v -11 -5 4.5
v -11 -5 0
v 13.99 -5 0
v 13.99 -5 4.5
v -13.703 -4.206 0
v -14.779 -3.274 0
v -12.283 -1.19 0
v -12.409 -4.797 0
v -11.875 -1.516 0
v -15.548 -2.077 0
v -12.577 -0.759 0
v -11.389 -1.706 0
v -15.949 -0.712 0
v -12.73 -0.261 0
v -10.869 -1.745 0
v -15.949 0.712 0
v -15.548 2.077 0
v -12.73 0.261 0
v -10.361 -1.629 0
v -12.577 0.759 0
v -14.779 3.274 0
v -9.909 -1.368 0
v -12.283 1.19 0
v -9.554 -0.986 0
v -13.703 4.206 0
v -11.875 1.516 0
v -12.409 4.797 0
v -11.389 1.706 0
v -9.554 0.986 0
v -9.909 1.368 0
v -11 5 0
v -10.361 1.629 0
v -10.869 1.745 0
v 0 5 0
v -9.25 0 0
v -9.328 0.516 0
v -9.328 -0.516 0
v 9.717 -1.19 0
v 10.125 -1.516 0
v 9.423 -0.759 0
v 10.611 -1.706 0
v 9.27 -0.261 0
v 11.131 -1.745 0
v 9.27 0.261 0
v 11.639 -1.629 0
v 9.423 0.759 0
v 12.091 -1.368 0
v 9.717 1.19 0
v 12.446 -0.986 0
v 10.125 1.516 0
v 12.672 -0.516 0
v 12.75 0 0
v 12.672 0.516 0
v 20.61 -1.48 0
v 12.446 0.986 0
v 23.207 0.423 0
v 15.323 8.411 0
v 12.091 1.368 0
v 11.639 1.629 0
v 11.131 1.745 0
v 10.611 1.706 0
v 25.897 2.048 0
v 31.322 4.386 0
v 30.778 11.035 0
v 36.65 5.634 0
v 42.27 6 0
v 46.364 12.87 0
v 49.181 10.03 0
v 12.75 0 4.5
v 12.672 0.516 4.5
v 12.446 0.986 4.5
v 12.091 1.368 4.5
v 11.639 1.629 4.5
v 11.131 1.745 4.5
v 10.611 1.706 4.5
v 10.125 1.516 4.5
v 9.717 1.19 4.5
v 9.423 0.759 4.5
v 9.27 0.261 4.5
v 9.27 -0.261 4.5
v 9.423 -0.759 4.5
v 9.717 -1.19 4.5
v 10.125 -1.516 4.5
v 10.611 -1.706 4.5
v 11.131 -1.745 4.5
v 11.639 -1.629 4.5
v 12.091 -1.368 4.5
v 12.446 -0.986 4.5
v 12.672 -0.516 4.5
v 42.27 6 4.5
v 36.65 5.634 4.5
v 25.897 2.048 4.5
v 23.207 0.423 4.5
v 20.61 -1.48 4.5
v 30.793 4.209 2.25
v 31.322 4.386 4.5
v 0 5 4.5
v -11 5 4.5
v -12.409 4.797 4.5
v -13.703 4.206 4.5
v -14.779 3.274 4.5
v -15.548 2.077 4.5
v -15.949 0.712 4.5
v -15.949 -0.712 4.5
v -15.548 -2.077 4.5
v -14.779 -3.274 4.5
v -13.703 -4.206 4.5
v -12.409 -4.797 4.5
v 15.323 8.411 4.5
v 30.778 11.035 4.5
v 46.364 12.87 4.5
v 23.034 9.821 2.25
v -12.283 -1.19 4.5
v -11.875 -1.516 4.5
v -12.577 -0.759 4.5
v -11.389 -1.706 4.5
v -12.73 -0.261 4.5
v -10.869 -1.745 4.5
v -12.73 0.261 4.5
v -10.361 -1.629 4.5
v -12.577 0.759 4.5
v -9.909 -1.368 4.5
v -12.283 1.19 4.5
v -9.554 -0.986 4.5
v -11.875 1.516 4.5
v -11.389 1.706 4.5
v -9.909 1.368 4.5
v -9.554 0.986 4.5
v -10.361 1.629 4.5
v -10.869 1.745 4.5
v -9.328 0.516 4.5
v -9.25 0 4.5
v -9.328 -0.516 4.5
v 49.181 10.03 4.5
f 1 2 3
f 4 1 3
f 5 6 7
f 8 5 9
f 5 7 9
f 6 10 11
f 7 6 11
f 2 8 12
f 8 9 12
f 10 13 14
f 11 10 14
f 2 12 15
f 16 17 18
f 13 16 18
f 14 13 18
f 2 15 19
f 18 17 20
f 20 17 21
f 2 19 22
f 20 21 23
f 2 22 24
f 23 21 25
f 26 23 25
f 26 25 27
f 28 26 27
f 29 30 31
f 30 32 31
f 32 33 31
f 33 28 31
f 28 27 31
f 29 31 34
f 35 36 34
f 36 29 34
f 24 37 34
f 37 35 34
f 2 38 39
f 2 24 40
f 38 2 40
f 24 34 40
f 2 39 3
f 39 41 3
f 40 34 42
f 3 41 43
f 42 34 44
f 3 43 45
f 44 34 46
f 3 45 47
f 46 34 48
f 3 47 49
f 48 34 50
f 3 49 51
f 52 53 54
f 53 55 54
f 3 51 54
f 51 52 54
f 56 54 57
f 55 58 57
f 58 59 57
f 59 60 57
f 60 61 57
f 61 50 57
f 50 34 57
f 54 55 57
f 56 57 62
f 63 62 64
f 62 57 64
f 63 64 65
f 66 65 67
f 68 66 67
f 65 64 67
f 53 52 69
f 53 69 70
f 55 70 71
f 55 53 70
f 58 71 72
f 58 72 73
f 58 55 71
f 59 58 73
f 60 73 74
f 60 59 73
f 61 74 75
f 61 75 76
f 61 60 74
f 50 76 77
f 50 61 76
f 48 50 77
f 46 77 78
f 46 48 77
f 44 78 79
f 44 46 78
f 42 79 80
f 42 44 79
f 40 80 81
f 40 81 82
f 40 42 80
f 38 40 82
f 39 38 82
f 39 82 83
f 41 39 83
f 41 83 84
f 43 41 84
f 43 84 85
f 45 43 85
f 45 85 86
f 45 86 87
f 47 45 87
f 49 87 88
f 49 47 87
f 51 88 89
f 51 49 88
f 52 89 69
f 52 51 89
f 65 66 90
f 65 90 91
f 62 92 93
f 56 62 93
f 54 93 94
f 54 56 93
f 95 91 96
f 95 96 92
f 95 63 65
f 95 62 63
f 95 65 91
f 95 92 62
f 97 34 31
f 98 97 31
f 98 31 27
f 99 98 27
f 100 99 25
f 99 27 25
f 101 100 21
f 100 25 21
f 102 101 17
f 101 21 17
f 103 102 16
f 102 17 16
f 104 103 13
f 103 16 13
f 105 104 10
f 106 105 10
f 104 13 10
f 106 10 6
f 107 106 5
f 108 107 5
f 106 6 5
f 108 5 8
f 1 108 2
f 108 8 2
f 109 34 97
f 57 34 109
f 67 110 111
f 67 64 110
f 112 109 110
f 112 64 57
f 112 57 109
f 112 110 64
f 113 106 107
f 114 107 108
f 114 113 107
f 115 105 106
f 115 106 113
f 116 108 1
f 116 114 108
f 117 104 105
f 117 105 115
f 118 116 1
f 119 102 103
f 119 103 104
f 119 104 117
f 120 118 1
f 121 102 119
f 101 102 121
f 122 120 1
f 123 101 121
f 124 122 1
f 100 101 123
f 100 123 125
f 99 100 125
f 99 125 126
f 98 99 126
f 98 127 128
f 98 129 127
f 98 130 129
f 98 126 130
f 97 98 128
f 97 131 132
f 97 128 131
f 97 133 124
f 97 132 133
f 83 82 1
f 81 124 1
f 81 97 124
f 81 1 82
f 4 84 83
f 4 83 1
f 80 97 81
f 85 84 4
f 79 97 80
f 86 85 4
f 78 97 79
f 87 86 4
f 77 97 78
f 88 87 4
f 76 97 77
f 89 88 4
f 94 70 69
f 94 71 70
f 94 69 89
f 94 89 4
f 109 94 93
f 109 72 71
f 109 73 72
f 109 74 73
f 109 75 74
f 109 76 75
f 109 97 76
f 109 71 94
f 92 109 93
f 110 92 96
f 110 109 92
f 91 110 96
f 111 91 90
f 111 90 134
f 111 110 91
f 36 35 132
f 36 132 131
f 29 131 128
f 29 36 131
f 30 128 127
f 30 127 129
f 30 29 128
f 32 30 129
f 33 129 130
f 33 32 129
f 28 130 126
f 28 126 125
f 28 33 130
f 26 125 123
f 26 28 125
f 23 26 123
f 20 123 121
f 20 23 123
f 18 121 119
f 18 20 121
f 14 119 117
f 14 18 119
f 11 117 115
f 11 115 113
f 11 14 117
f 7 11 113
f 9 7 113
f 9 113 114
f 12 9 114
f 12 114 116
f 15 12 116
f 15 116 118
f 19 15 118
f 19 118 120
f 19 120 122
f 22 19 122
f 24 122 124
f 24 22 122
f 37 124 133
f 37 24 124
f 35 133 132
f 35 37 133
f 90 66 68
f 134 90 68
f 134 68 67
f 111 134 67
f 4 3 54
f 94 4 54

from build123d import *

# Parameters (mm, degrees)
SKETCH1_R           = 5
SKETCH1_R_2         = 1.75
BOSS_EXTRUDE1_DEPTH = 4.5
BOSS_EXTRUDE2_START = -4.5
BOSS_EXTRUDE2_DEPTH = 4.5


with BuildPart() as part:
    # Sketch1 → Boss-Extrude1 (new body)
    # profile 1 of 3: a face of its own
    with BuildSketch(Plane.XY):
        with Locations((-11, 0)):
            Circle(SKETCH1_R)
        with Locations((-11, 0)):
            Circle(SKETCH1_R_2, mode=Mode.SUBTRACT)
    # profile 2 of 3: a face of its own
    with BuildSketch(Plane.XY):
        with BuildLine():
            ThreePointArc((-6, 0), (-7.464466094, -3.535533906), (-11, -5))
            Line((-11, -5), (11, -5))
            ThreePointArc((11, -5), (6, 0), (11, 5))
            Line((11, 5), (-11, 5))
            ThreePointArc((-11, 5), (-7.464466094, 3.535533906), (-6, 0))
        make_face()
    # profile 3 of 3: a face of its own
    with BuildSketch(Plane.XY):
        with Locations((11, 0)):
            Circle(SKETCH1_R)
        with Locations((11, 0)):
            Circle(SKETCH1_R_2, mode=Mode.SUBTRACT)
    extrude(amount=BOSS_EXTRUDE1_DEPTH)

    # Sketch2 → Boss-Extrude2 (add)
    with BuildSketch(Plane.XY.offset(4.5).offset(BOSS_EXTRUDE2_START)):
        with BuildLine():
            Line((49.180795902, 10.03), (46.363989199, 12.87))
            add(Edge.make_bspline(
                [(0, 5), (22.885517501, 10.707926651), (46.363989199, 12.87)],
                knots=[0, 0, 0, 1, 1, 1], degree=2))
            Line((0, 5), (11, 5))
            ThreePointArc((11, 5), (16, 0), (11, -5))
            Line((11, -5), (13.99, -5))
            Line((13.99, -5), (20.61, -1.48))
            add(Edge.make_bspline(
                [(42.27, 6), (30.146150748, 6.157348305), (20.61, -1.48)],
                knots=[0, 0, 0, 1, 1, 1], degree=2))
            Line((42.27, 6), (49.180795902, 10.03))
        make_face()
    extrude(amount=BOSS_EXTRUDE2_DEPTH)


solid = part.part
